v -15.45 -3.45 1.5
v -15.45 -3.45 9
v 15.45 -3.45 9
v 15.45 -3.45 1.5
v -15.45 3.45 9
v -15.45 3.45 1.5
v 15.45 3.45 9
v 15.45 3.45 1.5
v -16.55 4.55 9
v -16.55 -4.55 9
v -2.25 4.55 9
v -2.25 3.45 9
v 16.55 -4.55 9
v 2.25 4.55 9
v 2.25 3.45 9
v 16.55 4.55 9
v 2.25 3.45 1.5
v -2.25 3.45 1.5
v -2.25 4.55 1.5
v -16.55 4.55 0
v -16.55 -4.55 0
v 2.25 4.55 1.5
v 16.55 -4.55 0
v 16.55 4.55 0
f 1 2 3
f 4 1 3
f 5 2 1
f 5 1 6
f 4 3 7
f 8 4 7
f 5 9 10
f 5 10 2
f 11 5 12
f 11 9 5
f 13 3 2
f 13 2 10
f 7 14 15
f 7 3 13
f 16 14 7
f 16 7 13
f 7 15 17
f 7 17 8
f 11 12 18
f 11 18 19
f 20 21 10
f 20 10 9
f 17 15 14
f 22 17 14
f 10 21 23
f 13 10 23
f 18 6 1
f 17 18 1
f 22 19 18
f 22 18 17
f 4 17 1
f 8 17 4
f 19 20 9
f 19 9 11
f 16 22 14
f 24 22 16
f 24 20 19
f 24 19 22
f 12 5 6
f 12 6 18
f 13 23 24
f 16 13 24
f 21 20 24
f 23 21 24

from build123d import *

# Parameters (mm, degrees)
SKETCH_2_W          = 33.1
SKETCH_2_H          = 9.1
EXTRUDE_1_DEPTH     = 9
SKETCH_3_W          = 30.9
SKETCH_3_H          = 6.9
CUT_EXTRUDE_1_DEPTH = 7.5
SKETCH_4_W          = 4.5
SKETCH_4_H          = 1.1
CUT_EXTRUDE_2_DEPTH = 7.5


with BuildPart() as part:
    # Эскиз2 → Бобышка-Вытянуть1 (new body)
    with BuildSketch(Plane.XY):
        Rectangle(SKETCH_2_W, SKETCH_2_H)
    extrude(amount=EXTRUDE_1_DEPTH)

    # Эскиз3 → Вырез-Вытянуть1 (cut)
    with BuildSketch(Plane.XY.offset(9)):
        Rectangle(SKETCH_3_W, SKETCH_3_H)
    extrude(amount=-CUT_EXTRUDE_1_DEPTH, mode=Mode.SUBTRACT)

    # Эскиз4 → Вырез-Вытянуть2 (cut)
    with BuildSketch(Plane.XY.offset(9)):
        with Locations((0, 4)):
            Rectangle(SKETCH_4_W, SKETCH_4_H)
    extrude(amount=-CUT_EXTRUDE_2_DEPTH, mode=Mode.SUBTRACT)


solid = part.part
